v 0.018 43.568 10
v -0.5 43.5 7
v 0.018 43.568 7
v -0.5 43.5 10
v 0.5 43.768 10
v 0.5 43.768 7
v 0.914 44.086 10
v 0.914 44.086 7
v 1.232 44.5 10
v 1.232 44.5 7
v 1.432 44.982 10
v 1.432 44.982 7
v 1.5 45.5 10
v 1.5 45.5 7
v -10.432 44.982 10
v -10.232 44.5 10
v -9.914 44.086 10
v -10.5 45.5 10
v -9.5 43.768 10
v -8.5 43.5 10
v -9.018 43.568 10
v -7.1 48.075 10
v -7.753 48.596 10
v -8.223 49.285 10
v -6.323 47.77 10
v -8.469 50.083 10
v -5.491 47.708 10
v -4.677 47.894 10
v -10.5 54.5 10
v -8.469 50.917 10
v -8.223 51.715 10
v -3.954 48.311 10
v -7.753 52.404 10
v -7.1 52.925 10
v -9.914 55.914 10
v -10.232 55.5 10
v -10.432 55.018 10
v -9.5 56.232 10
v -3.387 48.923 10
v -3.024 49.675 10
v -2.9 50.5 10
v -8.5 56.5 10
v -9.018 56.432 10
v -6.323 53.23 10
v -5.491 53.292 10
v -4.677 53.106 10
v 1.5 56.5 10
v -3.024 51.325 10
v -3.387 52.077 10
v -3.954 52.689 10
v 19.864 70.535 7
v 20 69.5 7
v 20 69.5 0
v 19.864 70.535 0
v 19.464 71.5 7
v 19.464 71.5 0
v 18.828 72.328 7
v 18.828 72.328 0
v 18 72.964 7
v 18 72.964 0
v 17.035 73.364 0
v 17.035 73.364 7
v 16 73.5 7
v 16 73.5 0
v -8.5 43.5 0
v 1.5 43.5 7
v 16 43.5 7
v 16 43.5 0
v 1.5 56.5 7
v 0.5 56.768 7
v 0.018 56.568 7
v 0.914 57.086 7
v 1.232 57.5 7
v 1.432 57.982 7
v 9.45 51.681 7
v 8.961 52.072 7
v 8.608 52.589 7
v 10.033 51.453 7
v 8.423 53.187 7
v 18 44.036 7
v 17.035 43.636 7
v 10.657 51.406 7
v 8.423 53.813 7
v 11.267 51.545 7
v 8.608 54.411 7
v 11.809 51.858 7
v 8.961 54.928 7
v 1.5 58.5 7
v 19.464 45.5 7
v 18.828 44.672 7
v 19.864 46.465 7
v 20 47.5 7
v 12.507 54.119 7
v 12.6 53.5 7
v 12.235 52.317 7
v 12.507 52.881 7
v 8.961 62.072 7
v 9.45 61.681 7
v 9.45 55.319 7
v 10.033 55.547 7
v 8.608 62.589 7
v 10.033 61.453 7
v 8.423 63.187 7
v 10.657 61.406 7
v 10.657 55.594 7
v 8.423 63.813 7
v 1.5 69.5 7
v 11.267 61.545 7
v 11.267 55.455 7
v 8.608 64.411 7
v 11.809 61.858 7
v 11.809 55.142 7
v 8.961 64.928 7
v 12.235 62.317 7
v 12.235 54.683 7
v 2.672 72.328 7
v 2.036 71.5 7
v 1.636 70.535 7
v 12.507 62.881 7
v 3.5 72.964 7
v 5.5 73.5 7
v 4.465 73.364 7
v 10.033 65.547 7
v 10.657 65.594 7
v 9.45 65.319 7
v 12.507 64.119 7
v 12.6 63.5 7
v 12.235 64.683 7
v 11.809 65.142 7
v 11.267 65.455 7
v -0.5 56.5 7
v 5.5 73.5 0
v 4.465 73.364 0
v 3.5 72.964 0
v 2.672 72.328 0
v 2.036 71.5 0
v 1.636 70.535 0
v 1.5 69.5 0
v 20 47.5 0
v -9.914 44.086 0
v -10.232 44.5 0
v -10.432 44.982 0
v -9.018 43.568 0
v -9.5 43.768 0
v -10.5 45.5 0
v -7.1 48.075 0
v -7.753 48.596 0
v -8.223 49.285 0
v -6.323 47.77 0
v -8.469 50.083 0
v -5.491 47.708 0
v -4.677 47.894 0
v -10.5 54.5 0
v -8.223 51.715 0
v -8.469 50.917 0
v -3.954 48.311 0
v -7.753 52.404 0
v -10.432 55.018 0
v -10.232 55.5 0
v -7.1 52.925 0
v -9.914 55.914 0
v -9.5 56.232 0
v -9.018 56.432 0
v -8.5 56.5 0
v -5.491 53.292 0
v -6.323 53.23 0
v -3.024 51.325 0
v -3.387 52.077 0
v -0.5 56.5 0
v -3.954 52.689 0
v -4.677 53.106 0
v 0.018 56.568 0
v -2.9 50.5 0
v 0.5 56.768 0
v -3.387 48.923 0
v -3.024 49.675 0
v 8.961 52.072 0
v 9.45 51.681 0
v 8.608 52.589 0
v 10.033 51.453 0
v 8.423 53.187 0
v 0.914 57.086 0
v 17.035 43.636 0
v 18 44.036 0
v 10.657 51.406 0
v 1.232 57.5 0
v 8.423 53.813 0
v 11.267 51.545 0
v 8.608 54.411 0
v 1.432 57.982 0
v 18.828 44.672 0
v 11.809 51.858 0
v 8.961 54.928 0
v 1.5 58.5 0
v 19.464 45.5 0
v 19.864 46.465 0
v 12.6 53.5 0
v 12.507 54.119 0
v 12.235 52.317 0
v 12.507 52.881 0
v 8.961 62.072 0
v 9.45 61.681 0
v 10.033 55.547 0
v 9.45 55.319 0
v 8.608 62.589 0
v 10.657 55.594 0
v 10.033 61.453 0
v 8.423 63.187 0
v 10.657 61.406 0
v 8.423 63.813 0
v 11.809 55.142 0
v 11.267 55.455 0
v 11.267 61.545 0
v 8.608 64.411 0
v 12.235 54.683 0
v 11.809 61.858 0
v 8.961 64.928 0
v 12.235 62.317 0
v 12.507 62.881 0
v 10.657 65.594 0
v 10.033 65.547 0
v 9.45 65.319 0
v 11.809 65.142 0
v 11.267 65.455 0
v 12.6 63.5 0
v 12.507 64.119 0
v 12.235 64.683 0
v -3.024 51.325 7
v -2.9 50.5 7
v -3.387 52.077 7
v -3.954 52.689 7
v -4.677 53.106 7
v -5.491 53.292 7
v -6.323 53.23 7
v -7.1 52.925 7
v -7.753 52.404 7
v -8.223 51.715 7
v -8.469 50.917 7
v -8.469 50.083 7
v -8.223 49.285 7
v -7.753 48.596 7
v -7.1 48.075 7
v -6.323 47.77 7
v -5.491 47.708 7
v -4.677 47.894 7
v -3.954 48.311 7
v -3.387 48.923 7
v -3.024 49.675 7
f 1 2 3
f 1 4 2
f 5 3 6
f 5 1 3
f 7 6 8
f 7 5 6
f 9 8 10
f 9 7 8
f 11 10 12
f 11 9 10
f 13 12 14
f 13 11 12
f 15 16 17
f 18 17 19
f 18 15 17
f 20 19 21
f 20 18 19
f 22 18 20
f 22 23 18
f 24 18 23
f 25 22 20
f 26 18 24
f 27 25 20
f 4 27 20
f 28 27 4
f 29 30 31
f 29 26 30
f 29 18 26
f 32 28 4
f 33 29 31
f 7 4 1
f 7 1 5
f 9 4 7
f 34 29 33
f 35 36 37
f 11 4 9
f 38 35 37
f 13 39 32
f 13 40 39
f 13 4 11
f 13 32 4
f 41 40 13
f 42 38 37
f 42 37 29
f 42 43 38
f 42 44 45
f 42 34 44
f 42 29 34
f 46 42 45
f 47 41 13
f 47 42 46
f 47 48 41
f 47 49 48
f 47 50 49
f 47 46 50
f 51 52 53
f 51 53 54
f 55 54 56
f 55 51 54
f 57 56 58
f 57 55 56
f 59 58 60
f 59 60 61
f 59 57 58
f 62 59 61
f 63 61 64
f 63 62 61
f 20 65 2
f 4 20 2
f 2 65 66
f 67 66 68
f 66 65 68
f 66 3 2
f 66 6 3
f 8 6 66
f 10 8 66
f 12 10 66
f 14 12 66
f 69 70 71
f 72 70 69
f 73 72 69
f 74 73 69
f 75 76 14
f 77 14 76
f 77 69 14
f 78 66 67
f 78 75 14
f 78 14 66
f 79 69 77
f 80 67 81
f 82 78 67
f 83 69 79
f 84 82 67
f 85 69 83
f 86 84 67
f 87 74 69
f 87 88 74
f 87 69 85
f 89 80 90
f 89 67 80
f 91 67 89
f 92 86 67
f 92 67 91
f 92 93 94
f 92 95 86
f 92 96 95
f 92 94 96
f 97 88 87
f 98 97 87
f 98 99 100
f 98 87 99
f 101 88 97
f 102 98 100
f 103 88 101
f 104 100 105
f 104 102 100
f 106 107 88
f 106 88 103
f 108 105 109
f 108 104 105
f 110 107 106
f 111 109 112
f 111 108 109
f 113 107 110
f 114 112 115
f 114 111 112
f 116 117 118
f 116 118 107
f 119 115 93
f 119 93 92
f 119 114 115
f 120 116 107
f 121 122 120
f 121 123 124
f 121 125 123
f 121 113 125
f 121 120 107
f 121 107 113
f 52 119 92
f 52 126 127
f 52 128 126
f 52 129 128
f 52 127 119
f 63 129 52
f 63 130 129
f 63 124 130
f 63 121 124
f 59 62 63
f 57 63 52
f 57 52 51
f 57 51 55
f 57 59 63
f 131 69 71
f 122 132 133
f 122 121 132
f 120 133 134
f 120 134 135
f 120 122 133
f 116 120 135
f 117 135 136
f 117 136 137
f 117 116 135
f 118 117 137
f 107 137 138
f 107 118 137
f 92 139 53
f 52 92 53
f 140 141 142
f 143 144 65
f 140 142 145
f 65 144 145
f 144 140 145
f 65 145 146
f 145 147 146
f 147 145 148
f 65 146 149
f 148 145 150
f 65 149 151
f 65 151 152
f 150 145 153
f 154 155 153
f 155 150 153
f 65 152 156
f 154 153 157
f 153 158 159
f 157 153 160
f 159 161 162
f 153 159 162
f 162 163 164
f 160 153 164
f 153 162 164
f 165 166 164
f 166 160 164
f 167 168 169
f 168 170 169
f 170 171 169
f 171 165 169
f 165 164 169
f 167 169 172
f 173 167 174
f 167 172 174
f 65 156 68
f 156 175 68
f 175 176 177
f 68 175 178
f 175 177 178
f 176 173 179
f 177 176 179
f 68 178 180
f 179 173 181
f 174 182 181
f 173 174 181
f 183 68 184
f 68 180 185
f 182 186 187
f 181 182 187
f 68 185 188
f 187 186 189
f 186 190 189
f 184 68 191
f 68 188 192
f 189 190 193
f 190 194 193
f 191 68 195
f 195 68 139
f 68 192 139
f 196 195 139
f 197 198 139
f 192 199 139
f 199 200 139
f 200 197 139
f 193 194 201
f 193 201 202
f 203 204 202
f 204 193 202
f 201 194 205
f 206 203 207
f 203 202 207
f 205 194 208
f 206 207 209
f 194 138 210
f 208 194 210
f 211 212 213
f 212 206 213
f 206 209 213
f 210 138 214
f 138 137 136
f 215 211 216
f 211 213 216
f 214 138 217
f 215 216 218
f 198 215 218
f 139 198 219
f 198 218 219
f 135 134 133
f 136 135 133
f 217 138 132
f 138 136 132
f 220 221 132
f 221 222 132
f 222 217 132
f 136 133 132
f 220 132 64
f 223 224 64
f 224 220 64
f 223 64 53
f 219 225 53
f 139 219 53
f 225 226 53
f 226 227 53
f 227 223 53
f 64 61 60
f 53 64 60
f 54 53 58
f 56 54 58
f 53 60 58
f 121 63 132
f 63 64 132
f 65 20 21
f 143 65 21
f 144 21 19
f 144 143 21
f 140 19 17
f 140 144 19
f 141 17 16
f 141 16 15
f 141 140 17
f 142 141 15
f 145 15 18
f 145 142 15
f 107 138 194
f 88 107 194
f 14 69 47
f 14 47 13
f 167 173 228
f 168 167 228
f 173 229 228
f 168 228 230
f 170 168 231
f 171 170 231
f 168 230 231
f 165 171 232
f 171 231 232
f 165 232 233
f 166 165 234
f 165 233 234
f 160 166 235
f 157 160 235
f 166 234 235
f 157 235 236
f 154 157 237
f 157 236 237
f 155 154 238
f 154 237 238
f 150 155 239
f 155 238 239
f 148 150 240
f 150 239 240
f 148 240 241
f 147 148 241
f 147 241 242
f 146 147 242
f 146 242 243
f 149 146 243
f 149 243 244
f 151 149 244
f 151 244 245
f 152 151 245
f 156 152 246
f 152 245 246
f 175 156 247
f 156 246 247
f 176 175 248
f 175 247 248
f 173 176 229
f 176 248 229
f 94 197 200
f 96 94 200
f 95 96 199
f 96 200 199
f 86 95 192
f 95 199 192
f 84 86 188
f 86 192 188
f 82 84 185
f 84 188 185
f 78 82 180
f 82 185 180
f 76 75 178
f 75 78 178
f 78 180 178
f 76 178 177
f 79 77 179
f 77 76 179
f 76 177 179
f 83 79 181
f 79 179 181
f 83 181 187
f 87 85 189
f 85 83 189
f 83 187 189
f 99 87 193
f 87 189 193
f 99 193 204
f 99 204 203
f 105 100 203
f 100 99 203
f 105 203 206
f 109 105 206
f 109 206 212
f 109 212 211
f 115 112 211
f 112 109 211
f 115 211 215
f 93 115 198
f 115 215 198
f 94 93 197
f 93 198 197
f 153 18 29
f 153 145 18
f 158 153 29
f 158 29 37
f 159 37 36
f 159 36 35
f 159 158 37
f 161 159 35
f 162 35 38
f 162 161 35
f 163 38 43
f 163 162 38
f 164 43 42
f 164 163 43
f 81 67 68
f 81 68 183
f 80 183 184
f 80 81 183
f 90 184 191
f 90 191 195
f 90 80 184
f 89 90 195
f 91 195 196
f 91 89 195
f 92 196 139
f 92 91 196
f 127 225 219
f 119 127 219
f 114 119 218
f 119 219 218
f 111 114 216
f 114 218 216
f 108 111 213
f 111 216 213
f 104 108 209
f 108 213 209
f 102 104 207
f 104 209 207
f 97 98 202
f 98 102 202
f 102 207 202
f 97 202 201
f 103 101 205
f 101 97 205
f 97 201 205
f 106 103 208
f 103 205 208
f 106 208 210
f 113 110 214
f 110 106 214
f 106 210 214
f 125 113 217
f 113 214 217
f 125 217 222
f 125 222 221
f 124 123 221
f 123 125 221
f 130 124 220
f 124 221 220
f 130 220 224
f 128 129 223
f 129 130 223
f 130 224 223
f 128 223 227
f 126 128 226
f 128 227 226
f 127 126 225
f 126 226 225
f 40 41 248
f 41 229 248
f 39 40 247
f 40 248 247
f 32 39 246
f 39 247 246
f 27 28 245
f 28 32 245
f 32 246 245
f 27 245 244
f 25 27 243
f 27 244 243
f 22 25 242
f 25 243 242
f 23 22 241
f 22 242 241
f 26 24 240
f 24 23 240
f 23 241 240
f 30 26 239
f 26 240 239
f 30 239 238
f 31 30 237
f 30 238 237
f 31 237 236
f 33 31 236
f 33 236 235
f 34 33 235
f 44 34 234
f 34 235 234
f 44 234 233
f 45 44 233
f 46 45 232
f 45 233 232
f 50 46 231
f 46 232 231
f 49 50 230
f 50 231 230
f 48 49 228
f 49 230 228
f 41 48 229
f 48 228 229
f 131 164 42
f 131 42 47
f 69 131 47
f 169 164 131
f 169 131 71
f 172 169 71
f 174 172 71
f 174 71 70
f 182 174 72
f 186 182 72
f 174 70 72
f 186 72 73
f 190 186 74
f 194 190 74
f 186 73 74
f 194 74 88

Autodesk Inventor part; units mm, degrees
ref_plane "YZ Plane" through (0, 0, 0) normal (1, 0, 0) x (0, 1, 0)
ref_plane "XZ Plane" through (0, 0, 0) normal (0, 1, 0) x (-1, 0, 0)
ref_plane "XY Plane" through (0, 0, 0) normal (0, 0, 1) x (1, 0, 0)
ref_plane "Work Plane1" through (0, 0, 0) normal (0, 0, 1) x (1, 0, 0)
ref_plane "Work Plane2" through (0, 0, 0) normal (0, 0, 1) x (1, 0, 0)
sketch "Sketch6" plane through (0, 0, 0) normal (0, 0, 1) x (1, 0, 0)
  line L0 (20, 33.25) -> (1.5, 33.25) projected
  line L1 (20, 33.25) -> (20, 108.5) projected
  line L2 (1.5, 108.5) -> (20, 108.5) projected
  line L3 (1.5, 33.25) -> (1.5, 44.75) projected
  circle A0 centre (10.5, 63.5) radius 2.1 projected
  circle A1 centre (10.5, 53.5) radius 2.1 projected
  line L4 (20, 73.5) -> (-19.5, 73.5)
  line L5 (-19.5, 73.5) -> (-19.5, 43.5)
  line L6 (-19.5, 43.5) -> (20, 43.5)
  line L7 (20, 43.5) -> (20, 73.5)
  line L8 (-71.5, 45.5) -> (-71.5, 108.5) projected
  line L9 (-19.5, 73.5) -> (1.5, 73.5)
  line L10 (1.5, 73.5) -> (1.5, 56.5)
  line L11 (1.5, 56.5) -> (-19.5, 56.5)
  line L12 (-19.5, 56.5) -> (-19.5, 73.5)
  line L13 (-10.5, 43.5) -> (-19.5, 43.5)
  line L14 (-19.5, 43.5) -> (-19.5, 56.5)
  line L15 (-19.5, 56.5) -> (-10.5, 56.5)
  line L16 (-10.5, 56.5) -> (-10.5, 43.5)
  line L17 (4.5, 44.75) -> (1.5, 44.75) projected
  line L18 (1.5, 56.25) -> (1.5, 108.5) projected
  line L19 (1.5, 56.25) -> (4.5, 56.25) projected
  line L20 (4.5, 56.25) -> (4.5, 44.75) projected
  point P0 (0, 0)
  point P1 (20, 43.5)
  point P2 (-71.5, 60.5)
  point P3 (1.5, 73.5)
  point P4 (1.5, 43.5)
  point P5 (1.5, 73.5)
  point P6 (1.5, 73.5)
  dimension "d28" = 10
  dimension "d29" = 10
  dimension "d92" = 30
  dimension "d94" = 17
  dimension "d95" = 9
extrude "Extrusion5" add sketch "Sketch6" along normal blind 7 contours L6 L3 L17 L20 L19 L18 L10 L4 L1 | L6 L16 L11 L18 L19 L20 L17 L3
ref_plane "Work Plane3" through (0, 0, 22) normal (0, 0, 1) x (1, 0, 0)
ref_plane "Work Plane4" through (0, 0, 17) normal (0, 0, 1) x (1, 0, 0)
sketch "Sketch17" plane through (0, 0, 17) normal (0, 0, 1) x (1, 0, 0)
  line L0 (-13, 58.5) -> (0, 58.5) projected
  line L1 (0, 58.5) -> (0, 88.5) projected
  line L2 (0, 88.5) -> (-13, 88.5) projected
  line L3 (-13, 88.5) -> (-13, 58.5) projected
  circle A0 centre (-5.7, 50.5) radius 2.8
  line L4 (1.5, 56.5) -> (-10.5, 56.5) projected
  line L5 (20, 43.5) -> (20, 73.5) projected
  line L6 (20, 73.5) -> (1.5, 73.5) projected
  line L7 (-10.5, 43.5) -> (20, 43.5) projected
  line L8 (-10.5, 56.5) -> (-10.5, 43.5) projected
  line L9 (1.5, 73.5) -> (1.5, 56.5) projected
  line L10 (1.5, 56.5) -> (-10.5, 56.5) projected
  point P0 (0, 0)
  point P1 (-6.5, 58.5)
  dimension "d75" = 7.3
  dimension "d88" = 5.6
  dimension "d103" = 7
extrude "Extrusion16" cut sketch "Sketch17" against normal through all contours A0
fillet "Fillet8" radius 4 3 edges at (20, 73.5, 3.5) (20, 43.5, 3.5) (1.5, 73.5, 3.5)
sketch "Sketch19" plane through (0, 0, 7) normal (0, 0, 1) x (1, 0, 0)
  line L0 (20, 47.5) -> (20, 69.5) projected
  line L1 (16, 73.5) -> (5.5, 73.5) projected
  line L2 (-10.5, 43.5) -> (16, 43.5) projected
  line L3 (-10.5, 43.5) -> (16, 43.5) projected
  line L4 (-10.5, 56.5) -> (1.5, 56.5)
  line L5 (1.5, 56.5) -> (1.5, 43.5)
  line L6 (1.5, 43.5) -> (-10.5, 43.5)
  line L7 (-10.5, 43.5) -> (-10.5, 56.5)
  circle A0 centre (-5.7, 50.5) radius 2.8 projected
  arc A1 (16, 43.5) -> (20, 47.5) centre (16, 47.5) ccw projected
  arc A2 (20, 69.5) -> (16, 73.5) centre (16, 69.5) ccw projected
  line L8 (1.5, 69.5) -> (1.5, 56.5) projected
  line L9 (1.5, 56.5) -> (-10.5, 56.5) projected
  line L10 (-10.5, 56.5) -> (-10.5, 43.5) projected
  arc A3 (5.5, 73.5) -> (1.5, 69.5) centre (5.5, 69.5) ccw projected
  point P0 (0, 0)
  point P1 (1.5, 43.5)
  point P2 (-15.5, 43.5)
  dimension "d99" = 18.5
extrude "Extrusion18" add sketch "Sketch19" along normal blind 3 contours L2 L7 L4 L5
fillet "Fillet10" radius 2 4 edges at (-10.5, 56.5, 5) (1.5, 43.5, 8.5) (-10.5, 43.5, 5) (1.5, 56.5, 3.5)
properties part number "base-tensioner_3DPrint"
